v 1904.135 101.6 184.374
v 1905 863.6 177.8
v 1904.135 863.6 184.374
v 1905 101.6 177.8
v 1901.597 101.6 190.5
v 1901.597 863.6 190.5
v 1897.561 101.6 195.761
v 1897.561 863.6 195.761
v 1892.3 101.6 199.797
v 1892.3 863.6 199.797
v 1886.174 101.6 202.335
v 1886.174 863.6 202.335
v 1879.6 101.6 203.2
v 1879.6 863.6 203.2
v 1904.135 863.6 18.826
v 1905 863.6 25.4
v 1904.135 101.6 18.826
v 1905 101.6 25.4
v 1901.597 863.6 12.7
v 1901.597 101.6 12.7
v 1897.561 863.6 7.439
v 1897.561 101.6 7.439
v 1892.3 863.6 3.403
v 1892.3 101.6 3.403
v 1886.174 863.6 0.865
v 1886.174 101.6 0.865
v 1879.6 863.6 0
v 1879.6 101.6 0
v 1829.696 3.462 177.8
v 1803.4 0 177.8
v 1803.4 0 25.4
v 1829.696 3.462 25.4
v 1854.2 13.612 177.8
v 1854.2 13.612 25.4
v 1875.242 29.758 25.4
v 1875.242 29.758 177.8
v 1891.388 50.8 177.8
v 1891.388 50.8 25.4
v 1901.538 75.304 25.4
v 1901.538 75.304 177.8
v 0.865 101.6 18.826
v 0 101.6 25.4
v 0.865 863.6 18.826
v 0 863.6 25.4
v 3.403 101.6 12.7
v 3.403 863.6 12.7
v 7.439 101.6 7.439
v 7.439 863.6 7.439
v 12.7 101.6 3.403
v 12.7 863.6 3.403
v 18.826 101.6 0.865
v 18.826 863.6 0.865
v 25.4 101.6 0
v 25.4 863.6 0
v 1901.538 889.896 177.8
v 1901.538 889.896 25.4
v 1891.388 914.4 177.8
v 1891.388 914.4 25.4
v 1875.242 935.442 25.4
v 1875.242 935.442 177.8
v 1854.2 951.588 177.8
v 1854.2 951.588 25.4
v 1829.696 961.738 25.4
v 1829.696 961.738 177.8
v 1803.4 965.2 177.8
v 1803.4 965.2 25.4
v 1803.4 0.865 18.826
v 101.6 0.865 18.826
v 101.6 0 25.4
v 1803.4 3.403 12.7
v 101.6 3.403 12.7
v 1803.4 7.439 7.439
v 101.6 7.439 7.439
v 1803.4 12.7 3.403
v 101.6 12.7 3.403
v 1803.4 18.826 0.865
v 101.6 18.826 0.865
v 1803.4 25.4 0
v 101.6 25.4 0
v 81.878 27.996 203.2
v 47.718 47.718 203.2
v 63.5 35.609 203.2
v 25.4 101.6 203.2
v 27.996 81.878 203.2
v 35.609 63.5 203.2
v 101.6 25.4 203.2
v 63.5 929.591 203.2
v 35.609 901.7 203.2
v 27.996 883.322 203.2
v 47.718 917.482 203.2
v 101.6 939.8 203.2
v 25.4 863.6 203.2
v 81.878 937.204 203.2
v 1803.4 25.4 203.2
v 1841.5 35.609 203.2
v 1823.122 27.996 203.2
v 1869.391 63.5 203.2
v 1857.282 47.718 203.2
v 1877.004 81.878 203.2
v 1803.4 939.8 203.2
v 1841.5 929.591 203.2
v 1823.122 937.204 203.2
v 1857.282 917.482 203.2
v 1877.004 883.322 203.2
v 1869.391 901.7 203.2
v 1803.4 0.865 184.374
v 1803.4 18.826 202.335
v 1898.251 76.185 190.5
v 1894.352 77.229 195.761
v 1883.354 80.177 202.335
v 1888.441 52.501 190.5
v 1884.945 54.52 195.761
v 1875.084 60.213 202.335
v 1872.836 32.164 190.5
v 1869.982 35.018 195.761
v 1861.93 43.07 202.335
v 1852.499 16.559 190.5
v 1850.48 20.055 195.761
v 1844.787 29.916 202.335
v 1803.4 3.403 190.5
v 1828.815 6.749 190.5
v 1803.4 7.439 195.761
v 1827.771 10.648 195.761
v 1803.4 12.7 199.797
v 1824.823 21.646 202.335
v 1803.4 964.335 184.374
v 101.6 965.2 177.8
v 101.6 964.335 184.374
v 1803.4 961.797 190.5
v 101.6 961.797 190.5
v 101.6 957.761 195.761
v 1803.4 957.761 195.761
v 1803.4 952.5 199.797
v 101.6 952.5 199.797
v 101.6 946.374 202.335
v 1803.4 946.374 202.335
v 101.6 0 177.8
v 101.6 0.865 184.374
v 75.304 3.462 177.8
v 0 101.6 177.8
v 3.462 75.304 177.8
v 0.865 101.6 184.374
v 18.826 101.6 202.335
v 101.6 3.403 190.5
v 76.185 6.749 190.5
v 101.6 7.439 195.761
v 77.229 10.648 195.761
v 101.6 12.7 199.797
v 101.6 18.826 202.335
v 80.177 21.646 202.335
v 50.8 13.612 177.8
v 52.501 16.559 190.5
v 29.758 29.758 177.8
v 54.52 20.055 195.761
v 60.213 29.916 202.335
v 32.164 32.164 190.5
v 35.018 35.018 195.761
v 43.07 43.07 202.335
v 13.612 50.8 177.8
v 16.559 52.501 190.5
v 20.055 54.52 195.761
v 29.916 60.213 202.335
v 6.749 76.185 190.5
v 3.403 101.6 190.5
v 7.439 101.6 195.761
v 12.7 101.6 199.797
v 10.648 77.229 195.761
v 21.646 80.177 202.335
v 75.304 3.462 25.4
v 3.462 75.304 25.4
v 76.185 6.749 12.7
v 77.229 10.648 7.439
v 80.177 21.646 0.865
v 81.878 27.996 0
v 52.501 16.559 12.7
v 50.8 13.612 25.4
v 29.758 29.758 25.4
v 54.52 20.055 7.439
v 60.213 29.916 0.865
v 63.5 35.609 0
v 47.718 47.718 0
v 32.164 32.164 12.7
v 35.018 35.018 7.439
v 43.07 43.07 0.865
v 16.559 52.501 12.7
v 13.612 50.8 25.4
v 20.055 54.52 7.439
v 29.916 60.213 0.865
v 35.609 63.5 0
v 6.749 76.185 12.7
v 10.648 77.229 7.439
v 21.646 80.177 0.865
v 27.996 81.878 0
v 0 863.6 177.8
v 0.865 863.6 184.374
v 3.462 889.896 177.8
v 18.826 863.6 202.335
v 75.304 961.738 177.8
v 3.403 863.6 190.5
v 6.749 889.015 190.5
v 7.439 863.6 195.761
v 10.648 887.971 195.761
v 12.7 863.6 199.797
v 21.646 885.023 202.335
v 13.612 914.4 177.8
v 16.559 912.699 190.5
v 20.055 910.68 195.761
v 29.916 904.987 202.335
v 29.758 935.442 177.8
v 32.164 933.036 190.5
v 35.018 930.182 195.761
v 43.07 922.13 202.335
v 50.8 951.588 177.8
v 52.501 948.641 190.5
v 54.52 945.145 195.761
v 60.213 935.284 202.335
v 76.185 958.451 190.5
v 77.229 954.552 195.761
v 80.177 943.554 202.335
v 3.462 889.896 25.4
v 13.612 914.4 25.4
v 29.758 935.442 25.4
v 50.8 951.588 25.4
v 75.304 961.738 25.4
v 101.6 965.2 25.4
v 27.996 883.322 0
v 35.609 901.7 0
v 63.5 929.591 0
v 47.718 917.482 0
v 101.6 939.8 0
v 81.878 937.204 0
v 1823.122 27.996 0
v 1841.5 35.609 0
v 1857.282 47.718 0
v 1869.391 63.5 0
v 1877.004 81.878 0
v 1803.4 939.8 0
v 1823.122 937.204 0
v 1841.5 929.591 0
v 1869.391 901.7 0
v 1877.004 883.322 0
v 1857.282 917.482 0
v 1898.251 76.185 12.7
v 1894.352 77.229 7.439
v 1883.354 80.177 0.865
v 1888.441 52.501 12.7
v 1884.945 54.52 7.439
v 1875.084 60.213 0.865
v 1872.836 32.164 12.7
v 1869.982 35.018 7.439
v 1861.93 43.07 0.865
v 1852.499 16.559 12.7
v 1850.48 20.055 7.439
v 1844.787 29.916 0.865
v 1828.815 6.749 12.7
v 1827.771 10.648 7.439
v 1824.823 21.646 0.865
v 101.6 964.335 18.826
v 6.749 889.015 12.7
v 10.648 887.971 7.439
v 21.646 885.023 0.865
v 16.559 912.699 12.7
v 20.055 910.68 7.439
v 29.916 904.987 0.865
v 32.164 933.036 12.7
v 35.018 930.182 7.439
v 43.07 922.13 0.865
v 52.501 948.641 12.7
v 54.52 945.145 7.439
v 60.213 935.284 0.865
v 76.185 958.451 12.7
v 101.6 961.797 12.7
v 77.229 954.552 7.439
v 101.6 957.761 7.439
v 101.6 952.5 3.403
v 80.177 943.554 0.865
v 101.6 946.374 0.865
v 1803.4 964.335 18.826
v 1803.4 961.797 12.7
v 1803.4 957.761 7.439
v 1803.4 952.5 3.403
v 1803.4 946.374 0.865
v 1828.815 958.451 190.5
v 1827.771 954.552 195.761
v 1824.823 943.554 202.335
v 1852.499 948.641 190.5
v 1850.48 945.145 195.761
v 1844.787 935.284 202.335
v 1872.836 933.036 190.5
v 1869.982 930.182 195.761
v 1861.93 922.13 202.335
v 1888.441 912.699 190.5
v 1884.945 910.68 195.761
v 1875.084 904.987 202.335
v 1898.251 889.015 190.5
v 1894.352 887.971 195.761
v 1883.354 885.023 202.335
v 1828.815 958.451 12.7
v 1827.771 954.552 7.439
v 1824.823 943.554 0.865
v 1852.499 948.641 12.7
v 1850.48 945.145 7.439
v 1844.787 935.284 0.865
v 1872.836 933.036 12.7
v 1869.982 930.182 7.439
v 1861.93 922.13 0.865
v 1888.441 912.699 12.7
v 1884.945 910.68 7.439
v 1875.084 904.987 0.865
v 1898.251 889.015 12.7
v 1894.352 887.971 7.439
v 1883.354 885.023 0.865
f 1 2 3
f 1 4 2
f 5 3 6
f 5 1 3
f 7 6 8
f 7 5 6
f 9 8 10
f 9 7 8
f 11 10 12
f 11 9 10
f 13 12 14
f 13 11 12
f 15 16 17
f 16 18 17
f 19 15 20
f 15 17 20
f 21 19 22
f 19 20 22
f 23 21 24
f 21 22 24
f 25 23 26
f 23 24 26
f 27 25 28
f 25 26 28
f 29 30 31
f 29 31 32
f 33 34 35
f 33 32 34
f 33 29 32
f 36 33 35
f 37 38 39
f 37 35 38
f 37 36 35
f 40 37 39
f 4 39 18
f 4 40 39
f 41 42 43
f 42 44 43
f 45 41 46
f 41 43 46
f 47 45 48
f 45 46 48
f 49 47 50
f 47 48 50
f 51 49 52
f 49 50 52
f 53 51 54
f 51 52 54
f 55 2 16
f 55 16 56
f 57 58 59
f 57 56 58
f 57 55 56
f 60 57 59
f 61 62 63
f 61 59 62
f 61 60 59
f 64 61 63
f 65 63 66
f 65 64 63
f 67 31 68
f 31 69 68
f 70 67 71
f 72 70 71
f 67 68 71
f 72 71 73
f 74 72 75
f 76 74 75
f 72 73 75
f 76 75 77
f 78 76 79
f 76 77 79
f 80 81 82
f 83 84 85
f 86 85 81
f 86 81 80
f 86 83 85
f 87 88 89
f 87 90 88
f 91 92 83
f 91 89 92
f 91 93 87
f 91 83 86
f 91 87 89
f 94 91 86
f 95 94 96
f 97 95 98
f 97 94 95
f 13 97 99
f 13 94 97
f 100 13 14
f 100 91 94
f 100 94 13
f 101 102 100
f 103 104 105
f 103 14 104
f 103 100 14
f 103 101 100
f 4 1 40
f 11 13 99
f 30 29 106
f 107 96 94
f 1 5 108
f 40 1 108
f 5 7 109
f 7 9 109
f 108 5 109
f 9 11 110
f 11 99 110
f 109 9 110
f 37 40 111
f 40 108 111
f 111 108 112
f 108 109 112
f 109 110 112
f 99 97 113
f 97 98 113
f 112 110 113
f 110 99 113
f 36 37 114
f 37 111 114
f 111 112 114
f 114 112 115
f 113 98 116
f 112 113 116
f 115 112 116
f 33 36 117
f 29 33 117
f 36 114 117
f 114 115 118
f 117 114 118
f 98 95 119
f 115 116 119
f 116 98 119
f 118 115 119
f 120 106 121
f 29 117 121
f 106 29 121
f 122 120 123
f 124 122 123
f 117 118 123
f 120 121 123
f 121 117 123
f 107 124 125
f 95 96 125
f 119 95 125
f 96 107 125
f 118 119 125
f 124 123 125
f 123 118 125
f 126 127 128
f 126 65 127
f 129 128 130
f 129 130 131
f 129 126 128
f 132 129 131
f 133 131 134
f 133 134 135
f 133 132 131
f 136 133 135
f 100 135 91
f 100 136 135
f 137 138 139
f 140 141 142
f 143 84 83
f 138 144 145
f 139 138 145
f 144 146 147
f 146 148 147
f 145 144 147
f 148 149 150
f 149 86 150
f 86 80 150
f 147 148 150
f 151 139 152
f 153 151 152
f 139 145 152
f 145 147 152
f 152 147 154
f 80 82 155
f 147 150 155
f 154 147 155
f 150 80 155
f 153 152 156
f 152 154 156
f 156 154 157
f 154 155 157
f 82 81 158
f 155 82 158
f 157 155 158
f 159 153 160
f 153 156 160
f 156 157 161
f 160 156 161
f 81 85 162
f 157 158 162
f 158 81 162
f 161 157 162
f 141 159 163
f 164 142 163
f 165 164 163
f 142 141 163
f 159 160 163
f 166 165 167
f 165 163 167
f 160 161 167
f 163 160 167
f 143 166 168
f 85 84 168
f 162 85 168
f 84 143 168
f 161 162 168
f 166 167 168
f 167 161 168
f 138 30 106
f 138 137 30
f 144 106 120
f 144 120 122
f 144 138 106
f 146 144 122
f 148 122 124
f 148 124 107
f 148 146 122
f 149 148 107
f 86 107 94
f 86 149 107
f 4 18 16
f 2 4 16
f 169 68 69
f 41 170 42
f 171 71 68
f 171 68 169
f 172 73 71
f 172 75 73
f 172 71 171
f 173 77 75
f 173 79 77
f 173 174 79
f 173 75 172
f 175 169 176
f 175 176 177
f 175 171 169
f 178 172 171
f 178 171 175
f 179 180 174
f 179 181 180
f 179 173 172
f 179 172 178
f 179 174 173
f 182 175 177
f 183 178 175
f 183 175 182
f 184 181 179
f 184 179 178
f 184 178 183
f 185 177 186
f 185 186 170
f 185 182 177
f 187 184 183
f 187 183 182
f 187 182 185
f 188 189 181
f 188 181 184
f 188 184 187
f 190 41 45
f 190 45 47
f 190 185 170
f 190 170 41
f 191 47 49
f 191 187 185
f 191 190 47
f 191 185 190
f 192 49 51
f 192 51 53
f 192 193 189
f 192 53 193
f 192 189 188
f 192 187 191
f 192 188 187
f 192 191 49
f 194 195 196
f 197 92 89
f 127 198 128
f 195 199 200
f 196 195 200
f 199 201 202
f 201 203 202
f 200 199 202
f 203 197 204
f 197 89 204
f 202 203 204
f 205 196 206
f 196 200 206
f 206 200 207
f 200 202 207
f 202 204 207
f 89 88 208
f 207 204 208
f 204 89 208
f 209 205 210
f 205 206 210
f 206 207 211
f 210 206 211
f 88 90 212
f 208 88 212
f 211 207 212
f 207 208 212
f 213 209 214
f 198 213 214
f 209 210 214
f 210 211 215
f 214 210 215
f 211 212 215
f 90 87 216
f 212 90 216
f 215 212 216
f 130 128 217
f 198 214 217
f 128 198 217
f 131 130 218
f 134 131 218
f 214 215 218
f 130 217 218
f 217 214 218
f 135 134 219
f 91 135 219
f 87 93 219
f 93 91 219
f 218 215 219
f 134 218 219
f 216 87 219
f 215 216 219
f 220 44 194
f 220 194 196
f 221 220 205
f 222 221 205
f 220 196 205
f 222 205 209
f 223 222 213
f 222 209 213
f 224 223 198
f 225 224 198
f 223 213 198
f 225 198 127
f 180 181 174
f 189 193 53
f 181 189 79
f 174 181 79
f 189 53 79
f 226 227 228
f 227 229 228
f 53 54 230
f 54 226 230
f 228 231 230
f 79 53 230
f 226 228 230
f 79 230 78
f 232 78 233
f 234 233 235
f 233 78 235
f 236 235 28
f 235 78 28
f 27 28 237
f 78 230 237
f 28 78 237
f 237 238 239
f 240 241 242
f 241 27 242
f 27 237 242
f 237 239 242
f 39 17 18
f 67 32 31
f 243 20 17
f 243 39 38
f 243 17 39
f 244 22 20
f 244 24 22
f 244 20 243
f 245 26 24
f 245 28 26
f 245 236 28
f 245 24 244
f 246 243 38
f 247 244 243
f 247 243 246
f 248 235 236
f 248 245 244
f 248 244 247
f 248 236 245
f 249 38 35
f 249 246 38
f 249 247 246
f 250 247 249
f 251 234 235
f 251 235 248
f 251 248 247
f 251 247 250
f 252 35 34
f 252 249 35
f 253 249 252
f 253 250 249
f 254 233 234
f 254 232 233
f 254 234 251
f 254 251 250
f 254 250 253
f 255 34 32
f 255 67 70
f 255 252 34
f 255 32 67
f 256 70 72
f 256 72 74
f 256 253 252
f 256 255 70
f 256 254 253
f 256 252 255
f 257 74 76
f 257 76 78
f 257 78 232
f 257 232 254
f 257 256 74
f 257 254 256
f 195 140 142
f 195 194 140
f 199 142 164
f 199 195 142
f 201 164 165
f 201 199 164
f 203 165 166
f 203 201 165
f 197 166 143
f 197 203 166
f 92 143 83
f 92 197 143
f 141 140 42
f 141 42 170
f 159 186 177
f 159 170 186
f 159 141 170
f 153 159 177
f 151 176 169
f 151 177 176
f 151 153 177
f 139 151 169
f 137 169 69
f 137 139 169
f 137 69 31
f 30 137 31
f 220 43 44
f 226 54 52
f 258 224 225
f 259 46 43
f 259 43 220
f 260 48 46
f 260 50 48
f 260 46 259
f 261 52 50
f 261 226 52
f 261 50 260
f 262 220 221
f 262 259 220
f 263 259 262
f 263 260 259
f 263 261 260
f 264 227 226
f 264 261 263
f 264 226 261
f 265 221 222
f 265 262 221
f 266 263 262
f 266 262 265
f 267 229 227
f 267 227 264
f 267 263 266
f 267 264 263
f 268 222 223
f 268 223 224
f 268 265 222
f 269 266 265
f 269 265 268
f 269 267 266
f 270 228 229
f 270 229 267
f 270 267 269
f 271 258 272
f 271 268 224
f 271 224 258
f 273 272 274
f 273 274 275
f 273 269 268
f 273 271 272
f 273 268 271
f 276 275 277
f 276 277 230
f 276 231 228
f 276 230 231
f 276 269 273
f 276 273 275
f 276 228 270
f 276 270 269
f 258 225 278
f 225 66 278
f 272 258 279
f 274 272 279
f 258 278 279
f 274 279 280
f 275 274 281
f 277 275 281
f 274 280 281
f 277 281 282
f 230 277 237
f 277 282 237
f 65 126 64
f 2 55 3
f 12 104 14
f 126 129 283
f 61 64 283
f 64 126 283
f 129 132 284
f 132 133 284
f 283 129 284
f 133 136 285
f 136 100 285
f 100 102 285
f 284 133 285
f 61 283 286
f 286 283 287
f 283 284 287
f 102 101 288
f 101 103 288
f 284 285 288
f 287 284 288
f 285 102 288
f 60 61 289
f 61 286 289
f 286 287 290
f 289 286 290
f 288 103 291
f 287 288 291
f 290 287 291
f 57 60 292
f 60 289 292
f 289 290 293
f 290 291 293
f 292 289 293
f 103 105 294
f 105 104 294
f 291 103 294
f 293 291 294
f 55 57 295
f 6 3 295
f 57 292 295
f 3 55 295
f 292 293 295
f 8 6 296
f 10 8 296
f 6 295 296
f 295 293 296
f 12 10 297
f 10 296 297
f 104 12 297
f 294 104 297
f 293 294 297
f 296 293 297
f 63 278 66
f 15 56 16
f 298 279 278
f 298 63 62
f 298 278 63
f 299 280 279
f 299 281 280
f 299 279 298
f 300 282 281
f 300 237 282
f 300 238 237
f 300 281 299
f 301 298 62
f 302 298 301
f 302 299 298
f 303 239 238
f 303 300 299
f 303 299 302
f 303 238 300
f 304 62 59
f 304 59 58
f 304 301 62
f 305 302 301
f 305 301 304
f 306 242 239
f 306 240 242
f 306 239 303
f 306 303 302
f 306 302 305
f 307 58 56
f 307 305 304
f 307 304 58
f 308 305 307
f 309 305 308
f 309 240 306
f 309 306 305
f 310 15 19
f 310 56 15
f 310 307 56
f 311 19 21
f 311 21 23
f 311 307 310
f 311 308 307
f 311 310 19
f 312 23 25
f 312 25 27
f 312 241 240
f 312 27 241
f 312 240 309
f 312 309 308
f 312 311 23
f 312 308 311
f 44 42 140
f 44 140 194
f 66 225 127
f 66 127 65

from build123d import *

# Parameters (mm, degrees)
F0_W     = 1905
F0_H     = 965.2
F1_DEPTH = 203.2
F2_R     = 101.6
F3_R     = 25.4
F4_R     = 25.4


with BuildPart() as f1:
    # F0 (on Top) → F1 (new body)
    with BuildSketch(Plane.XY):
        with Locations((952.5, 482.6)):
            Rectangle(F0_W, F0_H)
    extrude(amount=F1_DEPTH)

    # F2
    f2_edges = [f1.edges().sort_by_distance(p)[0] for p in [
        (0, 0, 101.6),
        (0, 965.2, 101.6),
        (1905, 0, 101.6),
        (1905, 965.2, 101.6),
    ]]
    fillet(f2_edges, radius=F2_R)

    # F3
    f3_edges = [f1.edges().sort_by_distance(p)[0] for p in [
        (0, 482.6, 203.2),
        (29.757951, 935.442049, 203.2),
        (29.757951, 29.757951, 203.2),
        (952.5, 965.2, 203.2),
        (952.5, 0, 203.2),
        (1875.242049, 935.442049, 203.2),
        (1875.242049, 29.757951, 203.2),
        (1905, 482.6, 203.2),
    ]]
    fillet(f3_edges, radius=F3_R)

    # F4
    f4_edges = [f1.edges().sort_by_distance(p)[0] for p in [
        (0, 482.6, 0),
        (29.757951, 935.442049, 0),
        (29.757951, 29.757951, 0),
        (952.5, 965.2, 0),
        (952.5, 0, 0),
        (1875.242049, 935.442049, 0),
        (1875.242049, 29.757951, 0),
        (1905, 482.6, 0),
    ]]
    fillet(f4_edges, radius=F4_R)


solid = f1.part
